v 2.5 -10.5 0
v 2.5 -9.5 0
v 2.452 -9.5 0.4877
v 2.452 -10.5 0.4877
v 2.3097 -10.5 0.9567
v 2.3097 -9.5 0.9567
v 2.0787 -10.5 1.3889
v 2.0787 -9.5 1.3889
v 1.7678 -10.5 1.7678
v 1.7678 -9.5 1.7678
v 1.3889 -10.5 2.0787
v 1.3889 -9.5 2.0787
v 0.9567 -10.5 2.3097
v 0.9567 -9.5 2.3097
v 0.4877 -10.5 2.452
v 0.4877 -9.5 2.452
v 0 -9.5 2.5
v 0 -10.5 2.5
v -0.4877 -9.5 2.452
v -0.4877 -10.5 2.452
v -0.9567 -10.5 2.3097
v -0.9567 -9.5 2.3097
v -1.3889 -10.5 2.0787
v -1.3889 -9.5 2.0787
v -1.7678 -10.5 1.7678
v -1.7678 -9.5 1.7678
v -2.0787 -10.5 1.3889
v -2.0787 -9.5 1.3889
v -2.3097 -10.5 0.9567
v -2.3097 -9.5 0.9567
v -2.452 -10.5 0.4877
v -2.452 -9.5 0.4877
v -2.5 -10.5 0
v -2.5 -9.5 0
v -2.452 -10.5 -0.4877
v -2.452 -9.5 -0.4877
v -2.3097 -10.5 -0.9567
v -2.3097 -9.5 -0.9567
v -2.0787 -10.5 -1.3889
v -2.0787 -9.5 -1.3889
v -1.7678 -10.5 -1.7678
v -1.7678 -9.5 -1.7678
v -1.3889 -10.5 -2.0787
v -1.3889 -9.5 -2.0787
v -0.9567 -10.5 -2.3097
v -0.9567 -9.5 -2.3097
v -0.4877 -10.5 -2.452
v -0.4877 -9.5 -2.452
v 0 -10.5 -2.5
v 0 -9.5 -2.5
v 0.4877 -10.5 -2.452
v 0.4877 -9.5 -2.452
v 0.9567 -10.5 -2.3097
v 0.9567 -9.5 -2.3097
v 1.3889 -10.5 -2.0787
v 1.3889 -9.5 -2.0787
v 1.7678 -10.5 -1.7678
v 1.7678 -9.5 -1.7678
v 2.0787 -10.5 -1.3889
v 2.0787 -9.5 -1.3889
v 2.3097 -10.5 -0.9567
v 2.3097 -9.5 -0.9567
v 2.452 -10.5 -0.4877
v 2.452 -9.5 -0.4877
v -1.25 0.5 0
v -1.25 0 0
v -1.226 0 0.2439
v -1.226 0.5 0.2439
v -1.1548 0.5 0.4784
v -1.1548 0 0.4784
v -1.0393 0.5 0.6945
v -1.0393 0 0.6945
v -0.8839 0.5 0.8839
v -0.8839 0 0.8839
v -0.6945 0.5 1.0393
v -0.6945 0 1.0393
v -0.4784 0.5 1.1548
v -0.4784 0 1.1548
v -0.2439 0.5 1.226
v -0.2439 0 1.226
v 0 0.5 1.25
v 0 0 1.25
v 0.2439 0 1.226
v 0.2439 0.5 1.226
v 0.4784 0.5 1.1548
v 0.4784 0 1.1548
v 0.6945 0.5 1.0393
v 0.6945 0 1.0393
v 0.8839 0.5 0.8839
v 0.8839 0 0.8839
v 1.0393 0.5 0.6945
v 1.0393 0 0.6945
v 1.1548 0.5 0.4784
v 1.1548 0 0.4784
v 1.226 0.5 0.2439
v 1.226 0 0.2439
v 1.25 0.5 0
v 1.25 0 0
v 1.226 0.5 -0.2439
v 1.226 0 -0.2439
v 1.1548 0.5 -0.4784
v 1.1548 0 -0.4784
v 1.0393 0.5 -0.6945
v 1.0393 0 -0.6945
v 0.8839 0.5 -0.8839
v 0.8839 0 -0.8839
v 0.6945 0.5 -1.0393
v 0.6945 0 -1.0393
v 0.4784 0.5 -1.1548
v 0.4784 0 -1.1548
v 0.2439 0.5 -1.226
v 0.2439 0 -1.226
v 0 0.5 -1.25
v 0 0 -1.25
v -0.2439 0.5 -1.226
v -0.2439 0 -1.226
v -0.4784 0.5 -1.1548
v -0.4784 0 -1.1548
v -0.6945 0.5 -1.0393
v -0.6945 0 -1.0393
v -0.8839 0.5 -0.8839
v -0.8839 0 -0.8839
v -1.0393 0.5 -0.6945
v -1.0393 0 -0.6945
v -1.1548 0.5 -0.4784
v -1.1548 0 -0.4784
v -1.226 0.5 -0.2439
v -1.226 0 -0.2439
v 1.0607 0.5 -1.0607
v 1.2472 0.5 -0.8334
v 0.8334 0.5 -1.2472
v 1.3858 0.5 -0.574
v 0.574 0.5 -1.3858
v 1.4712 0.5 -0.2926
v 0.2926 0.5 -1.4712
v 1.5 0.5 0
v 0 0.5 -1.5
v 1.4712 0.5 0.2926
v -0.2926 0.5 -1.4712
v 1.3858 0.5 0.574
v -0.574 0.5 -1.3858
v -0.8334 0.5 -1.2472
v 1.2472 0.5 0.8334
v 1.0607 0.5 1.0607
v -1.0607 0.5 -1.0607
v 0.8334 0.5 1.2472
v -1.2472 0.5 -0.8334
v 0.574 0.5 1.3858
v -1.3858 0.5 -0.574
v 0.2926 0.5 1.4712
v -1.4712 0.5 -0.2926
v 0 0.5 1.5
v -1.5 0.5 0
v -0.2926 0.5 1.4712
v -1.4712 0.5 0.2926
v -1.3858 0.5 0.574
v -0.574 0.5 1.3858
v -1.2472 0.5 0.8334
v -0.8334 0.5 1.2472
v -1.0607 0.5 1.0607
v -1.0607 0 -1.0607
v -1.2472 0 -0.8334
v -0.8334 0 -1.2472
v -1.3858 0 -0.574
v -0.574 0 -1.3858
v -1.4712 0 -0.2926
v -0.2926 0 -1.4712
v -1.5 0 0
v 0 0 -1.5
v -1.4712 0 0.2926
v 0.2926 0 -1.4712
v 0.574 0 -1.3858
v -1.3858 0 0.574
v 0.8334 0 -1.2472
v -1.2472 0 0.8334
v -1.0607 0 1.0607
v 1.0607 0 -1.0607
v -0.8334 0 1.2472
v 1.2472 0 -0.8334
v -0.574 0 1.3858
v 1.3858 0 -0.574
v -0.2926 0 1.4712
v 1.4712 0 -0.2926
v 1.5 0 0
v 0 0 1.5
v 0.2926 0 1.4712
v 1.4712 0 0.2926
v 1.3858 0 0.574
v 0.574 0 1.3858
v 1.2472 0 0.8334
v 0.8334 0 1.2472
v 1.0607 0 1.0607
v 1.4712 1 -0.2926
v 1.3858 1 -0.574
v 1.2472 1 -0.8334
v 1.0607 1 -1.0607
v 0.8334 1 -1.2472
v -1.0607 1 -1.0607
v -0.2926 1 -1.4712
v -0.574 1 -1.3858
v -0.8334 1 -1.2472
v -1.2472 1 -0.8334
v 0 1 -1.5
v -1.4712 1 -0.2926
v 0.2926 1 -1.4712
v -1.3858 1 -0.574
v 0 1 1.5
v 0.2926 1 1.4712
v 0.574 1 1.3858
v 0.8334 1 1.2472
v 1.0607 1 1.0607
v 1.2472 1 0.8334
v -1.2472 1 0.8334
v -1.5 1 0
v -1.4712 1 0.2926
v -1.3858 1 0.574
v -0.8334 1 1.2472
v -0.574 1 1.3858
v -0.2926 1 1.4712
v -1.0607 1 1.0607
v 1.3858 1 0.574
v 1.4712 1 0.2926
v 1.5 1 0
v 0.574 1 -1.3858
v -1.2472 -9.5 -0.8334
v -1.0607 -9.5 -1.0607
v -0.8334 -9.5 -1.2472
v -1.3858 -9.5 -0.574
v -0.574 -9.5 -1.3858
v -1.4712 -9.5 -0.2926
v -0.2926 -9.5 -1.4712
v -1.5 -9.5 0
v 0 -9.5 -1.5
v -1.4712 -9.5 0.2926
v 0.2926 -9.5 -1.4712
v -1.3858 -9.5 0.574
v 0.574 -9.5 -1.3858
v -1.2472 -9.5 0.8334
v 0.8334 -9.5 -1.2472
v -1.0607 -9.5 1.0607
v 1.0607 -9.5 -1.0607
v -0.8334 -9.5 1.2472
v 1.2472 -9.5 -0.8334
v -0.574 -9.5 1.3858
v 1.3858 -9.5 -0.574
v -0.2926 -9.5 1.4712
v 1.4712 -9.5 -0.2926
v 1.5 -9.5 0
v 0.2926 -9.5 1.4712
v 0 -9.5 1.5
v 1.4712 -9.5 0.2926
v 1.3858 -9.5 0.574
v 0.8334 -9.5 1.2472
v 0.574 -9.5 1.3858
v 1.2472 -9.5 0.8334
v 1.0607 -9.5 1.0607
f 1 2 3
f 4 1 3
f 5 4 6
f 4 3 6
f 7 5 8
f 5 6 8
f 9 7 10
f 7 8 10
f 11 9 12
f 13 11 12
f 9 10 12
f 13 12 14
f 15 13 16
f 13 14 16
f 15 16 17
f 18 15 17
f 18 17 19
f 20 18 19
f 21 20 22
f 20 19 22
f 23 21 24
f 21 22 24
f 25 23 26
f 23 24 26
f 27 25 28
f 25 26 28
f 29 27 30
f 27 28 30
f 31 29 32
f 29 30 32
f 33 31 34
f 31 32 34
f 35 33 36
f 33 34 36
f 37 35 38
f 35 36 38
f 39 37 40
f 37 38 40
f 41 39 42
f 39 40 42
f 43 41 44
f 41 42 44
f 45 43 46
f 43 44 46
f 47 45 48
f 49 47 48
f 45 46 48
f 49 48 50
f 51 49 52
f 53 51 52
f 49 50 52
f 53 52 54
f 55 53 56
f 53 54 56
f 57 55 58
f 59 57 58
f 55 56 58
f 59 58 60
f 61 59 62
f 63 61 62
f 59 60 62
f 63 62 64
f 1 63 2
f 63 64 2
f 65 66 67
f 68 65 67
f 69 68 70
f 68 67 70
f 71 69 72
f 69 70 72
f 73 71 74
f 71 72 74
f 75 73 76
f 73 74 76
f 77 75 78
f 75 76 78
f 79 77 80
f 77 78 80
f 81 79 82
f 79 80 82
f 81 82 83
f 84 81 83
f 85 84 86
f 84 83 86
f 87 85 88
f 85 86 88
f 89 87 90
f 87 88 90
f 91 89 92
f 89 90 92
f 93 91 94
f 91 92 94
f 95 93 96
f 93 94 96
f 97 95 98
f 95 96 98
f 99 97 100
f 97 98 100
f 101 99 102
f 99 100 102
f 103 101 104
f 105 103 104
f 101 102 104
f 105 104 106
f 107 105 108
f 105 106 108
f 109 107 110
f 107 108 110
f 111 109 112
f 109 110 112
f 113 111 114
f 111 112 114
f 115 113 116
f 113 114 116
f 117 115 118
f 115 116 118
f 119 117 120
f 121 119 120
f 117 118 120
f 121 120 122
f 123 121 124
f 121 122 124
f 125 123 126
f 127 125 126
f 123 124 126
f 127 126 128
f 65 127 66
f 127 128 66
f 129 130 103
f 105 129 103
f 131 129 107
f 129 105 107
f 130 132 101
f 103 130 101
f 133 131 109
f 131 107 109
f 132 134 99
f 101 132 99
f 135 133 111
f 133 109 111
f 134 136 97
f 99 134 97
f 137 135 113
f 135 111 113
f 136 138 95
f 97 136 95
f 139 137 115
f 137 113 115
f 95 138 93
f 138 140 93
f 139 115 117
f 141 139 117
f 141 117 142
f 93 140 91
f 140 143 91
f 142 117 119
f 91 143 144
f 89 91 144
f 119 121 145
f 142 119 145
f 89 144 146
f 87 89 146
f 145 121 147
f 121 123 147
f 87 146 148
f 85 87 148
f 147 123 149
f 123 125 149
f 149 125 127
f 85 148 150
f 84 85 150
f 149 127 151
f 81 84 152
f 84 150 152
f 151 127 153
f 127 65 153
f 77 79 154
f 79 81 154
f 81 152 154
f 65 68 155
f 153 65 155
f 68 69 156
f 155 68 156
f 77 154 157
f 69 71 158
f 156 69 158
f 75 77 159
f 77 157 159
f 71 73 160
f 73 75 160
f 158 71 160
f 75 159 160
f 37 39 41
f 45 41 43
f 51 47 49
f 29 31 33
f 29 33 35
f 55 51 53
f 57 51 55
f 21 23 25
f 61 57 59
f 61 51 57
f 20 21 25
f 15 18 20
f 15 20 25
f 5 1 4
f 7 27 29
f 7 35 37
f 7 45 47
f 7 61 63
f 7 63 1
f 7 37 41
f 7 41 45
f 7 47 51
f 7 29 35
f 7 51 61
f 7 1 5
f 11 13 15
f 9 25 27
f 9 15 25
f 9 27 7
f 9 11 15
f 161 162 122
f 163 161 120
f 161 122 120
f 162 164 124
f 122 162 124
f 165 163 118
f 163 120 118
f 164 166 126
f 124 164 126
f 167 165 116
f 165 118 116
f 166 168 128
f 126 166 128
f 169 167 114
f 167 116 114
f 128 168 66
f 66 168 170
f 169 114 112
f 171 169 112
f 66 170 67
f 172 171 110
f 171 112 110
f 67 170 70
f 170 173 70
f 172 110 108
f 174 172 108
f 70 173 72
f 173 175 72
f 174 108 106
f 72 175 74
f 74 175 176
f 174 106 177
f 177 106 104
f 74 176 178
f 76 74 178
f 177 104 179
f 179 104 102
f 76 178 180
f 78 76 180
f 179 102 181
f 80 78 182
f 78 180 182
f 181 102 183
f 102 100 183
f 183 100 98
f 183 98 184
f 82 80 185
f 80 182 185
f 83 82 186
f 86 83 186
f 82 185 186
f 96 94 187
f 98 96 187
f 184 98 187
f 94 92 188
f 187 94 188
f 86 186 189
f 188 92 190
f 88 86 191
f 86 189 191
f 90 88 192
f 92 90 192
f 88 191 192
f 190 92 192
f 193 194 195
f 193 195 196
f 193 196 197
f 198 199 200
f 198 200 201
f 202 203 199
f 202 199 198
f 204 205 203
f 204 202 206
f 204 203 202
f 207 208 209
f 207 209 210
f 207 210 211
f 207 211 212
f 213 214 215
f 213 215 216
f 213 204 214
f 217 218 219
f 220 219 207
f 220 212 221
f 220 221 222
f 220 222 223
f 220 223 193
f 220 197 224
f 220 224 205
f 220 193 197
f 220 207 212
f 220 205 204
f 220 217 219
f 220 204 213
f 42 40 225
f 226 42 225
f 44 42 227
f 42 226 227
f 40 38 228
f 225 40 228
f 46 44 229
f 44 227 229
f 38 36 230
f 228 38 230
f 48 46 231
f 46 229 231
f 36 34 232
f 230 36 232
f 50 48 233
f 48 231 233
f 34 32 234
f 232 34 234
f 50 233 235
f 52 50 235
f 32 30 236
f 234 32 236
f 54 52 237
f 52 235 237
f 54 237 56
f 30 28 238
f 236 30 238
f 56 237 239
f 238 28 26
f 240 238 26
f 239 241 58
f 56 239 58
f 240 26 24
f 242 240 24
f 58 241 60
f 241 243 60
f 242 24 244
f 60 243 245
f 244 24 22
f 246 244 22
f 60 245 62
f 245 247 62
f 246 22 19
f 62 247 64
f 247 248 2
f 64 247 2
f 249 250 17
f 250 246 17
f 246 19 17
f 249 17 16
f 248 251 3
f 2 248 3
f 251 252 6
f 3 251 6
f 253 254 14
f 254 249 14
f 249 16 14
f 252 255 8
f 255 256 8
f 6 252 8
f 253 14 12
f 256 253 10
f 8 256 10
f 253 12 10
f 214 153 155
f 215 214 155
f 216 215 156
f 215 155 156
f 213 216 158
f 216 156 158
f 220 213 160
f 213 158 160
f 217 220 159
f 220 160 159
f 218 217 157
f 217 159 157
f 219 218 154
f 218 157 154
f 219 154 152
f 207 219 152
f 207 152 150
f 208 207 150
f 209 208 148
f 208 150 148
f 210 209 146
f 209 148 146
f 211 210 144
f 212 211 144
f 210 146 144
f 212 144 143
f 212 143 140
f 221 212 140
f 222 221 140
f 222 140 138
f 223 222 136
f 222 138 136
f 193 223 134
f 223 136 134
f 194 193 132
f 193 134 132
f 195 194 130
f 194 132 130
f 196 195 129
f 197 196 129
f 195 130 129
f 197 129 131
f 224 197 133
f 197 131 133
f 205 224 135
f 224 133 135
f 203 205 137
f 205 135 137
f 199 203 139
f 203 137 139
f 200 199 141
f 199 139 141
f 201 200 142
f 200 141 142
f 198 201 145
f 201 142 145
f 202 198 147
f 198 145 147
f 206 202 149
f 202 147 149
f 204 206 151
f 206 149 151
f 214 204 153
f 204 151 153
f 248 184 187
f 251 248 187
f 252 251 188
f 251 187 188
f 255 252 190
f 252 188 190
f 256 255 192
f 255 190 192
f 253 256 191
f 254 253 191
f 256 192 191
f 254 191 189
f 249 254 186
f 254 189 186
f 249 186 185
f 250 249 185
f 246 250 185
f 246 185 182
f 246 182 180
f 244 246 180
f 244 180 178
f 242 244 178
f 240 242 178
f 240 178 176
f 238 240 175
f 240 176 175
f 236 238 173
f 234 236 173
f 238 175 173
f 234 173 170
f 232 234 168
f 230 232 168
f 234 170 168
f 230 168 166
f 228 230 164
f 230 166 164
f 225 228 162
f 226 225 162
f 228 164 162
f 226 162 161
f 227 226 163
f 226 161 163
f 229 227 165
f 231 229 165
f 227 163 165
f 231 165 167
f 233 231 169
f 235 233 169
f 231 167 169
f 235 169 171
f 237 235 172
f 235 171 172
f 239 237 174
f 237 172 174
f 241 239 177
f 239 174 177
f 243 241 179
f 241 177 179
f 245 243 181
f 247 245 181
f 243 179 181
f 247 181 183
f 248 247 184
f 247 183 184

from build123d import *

# Parameters (mm, degrees)
F0_R     = 1.5
F1_DEPTH = 9.5
F2_R     = 2.5
F3_DEPTH = 1
F4_R     = 1.25
F5_DEPTH = 0.5
F6_R     = 1.5
F7_DEPTH = 0.5


with BuildPart() as f1:
    # F0 (on Front) → F1 (new body)
    with BuildSketch(Plane.XZ):
        Circle(F0_R)
    extrude(amount=F1_DEPTH)

    # F2 (on face) → F3 (join)
    with BuildSketch(Plane.XZ.offset(9.5)):
        Circle(F2_R)
    extrude(amount=F3_DEPTH)

    # F4 (on face) → F5 (join)
    with BuildSketch(Plane(origin=(0, 0, 0), x_dir=(-1, 0, 0), z_dir=(0, 1, 0))):
        Circle(F4_R)
    extrude(amount=F5_DEPTH)

    # F6 (on face) → F7 (join)
    with BuildSketch(Plane(origin=(0, 0.5, 0), x_dir=(-1, 0, 0), z_dir=(0, 1, 0))):
        Circle(F6_R)
    extrude(amount=F7_DEPTH)


solid = f1.part
